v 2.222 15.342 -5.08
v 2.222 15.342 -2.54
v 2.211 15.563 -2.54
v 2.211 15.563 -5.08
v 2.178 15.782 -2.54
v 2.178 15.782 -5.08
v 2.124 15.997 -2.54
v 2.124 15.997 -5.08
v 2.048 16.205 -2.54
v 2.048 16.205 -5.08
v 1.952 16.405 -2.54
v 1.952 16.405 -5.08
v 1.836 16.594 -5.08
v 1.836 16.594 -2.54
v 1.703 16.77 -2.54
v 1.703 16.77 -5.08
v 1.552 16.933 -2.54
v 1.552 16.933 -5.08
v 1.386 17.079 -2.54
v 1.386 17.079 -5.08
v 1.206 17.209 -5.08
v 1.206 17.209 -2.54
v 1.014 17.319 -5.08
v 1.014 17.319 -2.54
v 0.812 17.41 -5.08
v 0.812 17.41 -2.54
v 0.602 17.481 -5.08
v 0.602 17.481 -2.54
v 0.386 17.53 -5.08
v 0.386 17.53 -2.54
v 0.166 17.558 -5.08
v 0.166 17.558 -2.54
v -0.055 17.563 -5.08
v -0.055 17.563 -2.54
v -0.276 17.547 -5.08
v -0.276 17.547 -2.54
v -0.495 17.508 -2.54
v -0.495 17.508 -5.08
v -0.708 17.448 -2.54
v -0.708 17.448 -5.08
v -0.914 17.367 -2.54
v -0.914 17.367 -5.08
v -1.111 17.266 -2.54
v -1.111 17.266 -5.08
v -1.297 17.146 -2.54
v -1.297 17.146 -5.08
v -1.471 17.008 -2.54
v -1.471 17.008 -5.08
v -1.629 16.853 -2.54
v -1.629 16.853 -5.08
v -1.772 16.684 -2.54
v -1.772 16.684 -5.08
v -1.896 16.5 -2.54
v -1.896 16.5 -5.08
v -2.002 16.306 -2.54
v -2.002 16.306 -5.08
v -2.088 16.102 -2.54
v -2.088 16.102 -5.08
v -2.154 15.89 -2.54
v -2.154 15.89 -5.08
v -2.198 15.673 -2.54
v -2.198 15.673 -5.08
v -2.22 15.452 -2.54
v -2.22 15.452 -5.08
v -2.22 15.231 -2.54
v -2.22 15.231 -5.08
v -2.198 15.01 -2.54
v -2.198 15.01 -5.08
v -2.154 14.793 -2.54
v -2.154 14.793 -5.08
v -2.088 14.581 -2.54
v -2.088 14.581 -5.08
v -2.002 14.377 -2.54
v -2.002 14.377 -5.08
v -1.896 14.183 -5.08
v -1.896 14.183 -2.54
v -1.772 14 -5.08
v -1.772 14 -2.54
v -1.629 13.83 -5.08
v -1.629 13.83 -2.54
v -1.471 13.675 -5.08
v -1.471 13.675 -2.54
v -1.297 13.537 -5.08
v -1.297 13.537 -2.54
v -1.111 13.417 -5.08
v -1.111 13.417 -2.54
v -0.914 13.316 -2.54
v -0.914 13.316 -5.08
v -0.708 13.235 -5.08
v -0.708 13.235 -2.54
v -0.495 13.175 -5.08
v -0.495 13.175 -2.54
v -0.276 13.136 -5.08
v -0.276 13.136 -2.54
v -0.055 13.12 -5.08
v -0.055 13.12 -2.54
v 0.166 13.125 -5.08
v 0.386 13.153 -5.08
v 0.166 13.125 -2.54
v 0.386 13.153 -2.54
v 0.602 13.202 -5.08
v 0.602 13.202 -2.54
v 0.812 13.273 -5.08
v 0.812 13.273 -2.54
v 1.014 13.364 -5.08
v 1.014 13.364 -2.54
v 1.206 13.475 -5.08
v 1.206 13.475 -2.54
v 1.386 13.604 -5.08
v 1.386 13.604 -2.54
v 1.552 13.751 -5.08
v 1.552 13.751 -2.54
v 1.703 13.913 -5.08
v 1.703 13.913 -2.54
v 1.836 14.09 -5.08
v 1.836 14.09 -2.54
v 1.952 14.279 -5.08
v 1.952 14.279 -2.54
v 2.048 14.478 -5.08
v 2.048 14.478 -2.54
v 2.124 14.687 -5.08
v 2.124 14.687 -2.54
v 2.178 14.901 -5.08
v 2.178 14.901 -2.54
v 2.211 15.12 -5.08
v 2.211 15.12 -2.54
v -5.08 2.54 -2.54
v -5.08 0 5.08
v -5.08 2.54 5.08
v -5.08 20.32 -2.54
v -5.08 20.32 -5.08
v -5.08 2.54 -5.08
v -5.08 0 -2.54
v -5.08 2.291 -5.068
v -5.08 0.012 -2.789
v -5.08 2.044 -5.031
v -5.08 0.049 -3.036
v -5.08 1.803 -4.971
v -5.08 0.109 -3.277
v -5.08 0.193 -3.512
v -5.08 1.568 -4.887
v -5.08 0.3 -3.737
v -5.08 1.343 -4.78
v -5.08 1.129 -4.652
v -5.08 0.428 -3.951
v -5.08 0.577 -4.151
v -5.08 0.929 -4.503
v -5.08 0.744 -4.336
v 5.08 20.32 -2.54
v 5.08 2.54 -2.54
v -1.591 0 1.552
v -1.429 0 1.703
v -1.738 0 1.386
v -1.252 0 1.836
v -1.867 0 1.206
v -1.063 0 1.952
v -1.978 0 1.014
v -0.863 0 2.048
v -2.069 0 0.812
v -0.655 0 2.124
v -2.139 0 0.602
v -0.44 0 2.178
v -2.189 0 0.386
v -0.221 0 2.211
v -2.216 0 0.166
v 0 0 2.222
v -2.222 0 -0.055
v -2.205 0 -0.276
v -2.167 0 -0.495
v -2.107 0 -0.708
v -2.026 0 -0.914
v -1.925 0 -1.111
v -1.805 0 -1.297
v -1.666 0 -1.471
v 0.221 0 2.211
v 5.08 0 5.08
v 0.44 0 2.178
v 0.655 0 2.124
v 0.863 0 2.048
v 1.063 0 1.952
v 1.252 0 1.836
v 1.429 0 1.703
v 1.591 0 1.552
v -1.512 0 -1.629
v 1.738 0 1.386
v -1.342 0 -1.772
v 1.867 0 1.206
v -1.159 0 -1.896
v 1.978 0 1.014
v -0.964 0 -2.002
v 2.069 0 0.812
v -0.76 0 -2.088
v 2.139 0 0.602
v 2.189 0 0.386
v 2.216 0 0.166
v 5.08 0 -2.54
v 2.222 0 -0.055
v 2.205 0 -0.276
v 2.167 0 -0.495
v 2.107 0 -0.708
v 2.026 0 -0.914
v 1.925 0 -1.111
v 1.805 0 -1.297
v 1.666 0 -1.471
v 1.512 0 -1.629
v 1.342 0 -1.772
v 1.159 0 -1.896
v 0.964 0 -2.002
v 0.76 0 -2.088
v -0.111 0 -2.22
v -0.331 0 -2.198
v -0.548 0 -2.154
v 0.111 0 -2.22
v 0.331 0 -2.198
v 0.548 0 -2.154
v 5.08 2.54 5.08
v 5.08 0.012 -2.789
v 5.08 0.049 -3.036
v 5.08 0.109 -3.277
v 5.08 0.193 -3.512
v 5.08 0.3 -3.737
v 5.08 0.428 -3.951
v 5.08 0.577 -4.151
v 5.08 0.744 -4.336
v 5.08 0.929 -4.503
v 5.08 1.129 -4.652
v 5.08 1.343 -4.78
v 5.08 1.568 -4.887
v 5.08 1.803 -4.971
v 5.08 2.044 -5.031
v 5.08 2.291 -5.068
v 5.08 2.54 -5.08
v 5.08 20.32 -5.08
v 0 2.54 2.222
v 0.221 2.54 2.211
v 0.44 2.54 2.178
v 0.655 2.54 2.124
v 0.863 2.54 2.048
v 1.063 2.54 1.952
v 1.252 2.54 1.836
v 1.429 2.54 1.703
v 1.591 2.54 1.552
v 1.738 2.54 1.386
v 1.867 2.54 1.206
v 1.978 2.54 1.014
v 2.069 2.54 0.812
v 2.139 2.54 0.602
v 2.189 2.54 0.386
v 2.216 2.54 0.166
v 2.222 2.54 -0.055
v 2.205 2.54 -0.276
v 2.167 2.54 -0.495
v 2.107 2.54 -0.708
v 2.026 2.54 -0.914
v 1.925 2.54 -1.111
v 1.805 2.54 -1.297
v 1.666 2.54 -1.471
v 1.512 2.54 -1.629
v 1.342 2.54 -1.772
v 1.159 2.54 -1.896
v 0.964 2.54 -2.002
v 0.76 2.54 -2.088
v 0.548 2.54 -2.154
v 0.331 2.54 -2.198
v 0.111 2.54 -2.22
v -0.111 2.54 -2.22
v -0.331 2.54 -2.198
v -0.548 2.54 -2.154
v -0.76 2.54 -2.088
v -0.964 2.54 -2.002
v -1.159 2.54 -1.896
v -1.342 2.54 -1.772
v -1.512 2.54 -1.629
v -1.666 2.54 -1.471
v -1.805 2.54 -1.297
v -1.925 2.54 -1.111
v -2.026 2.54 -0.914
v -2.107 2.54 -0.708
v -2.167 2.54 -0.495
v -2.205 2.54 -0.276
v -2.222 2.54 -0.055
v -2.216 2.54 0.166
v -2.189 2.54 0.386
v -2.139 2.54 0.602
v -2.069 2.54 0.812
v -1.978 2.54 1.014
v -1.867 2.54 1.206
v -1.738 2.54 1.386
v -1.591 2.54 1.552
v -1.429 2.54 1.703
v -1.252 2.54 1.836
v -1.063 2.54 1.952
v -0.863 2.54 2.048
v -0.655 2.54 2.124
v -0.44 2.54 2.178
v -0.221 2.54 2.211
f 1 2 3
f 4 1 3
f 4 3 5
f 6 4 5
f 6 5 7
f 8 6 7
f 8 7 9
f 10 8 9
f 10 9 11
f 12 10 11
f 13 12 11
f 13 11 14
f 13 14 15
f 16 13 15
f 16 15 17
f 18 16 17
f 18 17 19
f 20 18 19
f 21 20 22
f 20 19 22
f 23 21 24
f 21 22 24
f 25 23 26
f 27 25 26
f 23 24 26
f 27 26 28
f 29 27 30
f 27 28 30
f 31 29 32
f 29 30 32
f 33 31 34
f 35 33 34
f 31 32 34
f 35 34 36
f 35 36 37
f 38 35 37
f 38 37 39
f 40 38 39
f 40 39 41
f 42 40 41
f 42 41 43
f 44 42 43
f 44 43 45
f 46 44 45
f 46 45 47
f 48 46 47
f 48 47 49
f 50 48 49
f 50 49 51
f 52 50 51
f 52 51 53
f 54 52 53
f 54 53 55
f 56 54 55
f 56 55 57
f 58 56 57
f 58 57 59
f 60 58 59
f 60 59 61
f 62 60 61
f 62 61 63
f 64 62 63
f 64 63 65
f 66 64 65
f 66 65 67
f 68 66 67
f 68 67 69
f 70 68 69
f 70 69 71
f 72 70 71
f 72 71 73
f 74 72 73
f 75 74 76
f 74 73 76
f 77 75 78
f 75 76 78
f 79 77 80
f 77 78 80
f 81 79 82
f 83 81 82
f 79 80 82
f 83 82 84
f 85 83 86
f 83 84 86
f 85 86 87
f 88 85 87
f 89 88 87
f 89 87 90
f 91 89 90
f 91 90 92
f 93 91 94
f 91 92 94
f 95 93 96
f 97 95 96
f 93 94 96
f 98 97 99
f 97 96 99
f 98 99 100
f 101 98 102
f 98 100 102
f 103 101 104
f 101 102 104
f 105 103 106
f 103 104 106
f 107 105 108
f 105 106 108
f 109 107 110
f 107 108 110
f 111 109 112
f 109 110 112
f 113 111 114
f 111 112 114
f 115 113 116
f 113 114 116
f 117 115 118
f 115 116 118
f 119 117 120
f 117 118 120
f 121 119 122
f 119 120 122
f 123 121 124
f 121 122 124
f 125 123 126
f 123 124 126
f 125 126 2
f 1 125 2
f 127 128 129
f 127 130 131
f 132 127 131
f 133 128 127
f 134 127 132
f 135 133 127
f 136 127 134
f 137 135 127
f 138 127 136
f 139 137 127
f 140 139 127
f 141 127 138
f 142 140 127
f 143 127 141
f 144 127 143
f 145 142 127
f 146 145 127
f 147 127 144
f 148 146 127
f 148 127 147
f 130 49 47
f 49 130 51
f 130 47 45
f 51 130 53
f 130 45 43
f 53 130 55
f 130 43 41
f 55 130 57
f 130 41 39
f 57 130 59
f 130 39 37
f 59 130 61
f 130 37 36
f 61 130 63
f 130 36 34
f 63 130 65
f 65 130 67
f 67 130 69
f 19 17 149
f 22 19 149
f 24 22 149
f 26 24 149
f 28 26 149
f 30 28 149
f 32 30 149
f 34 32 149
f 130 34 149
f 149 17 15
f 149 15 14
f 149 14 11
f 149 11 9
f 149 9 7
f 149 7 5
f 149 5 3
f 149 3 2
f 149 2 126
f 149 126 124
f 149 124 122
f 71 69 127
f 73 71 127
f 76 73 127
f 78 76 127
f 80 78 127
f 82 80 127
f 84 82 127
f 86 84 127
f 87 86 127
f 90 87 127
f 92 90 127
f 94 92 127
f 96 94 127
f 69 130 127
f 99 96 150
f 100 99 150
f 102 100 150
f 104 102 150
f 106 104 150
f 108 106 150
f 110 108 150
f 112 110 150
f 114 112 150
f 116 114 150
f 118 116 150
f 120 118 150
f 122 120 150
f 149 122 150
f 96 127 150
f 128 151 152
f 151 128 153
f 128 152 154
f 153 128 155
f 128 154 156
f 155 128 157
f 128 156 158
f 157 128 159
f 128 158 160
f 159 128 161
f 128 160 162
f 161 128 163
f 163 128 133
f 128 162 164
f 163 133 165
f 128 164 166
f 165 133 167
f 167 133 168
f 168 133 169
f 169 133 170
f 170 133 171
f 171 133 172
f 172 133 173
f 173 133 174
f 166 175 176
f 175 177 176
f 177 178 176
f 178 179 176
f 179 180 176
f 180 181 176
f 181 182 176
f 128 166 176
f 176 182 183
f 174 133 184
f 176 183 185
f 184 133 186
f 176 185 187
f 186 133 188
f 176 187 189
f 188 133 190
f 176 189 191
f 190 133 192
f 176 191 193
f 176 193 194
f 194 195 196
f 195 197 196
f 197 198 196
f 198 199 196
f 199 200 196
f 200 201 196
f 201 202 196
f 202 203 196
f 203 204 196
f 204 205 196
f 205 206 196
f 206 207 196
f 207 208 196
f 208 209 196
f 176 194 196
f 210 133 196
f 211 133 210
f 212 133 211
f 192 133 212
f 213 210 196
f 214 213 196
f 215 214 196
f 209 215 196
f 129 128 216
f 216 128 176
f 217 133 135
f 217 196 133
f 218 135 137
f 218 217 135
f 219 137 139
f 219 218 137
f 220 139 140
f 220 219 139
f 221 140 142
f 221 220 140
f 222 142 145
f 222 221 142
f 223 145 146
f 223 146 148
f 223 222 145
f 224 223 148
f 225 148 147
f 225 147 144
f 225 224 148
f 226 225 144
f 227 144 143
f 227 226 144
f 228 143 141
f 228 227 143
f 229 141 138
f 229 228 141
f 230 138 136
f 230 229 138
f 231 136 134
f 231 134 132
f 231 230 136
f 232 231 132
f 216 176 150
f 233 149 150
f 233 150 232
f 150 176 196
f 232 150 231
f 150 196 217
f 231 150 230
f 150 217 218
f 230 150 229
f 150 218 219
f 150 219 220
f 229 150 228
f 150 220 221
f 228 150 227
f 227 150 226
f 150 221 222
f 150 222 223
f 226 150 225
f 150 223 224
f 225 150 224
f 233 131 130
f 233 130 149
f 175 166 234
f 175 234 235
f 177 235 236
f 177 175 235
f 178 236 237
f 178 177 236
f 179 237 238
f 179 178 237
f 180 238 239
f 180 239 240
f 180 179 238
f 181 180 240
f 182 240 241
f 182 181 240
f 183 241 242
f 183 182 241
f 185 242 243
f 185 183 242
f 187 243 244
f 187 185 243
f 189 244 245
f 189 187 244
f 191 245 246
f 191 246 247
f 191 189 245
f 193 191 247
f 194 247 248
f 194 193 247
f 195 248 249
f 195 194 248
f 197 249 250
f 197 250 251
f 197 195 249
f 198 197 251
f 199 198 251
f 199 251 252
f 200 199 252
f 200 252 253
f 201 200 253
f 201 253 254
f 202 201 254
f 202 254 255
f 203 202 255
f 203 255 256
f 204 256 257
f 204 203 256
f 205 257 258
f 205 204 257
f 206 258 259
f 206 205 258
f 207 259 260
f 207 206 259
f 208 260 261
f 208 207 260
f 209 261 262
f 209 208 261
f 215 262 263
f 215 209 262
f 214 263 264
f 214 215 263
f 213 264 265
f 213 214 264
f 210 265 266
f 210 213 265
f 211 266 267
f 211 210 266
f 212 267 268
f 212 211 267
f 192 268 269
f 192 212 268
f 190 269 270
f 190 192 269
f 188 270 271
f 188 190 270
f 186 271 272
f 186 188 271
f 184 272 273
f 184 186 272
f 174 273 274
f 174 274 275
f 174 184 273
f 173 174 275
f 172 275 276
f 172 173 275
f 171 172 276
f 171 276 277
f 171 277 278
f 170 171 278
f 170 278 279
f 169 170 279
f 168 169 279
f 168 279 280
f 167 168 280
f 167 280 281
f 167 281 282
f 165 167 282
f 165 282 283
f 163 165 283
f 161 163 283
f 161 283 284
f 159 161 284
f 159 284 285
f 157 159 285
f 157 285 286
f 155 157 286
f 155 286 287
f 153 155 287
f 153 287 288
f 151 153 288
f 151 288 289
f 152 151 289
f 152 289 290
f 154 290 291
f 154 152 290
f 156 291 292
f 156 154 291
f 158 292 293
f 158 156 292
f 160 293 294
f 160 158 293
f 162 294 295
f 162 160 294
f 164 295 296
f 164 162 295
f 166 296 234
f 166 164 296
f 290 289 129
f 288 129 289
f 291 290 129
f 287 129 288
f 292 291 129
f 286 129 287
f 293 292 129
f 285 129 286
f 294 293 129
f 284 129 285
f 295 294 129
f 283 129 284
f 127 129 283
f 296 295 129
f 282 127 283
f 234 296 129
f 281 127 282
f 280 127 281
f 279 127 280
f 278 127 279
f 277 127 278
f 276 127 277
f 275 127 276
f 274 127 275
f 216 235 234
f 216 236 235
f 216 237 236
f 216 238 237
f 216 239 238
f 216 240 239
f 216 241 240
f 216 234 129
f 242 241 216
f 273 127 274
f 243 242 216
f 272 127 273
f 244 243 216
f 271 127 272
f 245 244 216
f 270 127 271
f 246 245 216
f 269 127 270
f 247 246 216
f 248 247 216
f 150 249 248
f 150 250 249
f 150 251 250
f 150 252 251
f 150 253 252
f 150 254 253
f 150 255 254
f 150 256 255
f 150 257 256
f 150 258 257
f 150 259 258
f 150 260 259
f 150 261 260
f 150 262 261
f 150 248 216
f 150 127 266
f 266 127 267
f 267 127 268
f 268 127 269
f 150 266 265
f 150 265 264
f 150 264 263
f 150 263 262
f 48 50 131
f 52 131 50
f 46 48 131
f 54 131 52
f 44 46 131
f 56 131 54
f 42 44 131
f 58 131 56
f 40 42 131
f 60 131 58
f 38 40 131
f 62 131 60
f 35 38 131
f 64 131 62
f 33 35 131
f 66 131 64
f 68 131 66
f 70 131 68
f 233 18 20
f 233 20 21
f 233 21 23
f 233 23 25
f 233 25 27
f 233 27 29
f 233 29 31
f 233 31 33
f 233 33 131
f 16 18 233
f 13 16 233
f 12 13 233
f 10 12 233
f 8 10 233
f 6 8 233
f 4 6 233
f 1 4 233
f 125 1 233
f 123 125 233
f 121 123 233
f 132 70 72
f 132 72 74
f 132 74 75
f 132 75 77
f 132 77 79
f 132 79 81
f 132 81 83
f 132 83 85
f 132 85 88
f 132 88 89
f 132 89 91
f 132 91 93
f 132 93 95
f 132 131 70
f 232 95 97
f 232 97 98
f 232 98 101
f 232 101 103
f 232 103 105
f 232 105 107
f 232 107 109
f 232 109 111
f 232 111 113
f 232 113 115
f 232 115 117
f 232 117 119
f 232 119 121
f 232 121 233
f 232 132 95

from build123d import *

# Parameters (mm, degrees)
SKETCH1_W           = 10.16
SKETCH1_H           = 7.62
SKETCH1_R           = 2.2225
BOSS_EXTRUDE1_DEPTH = 2.54
SKETCH1_4_W         = 10.16
SKETCH1_4_H         = 2.54
BOSS_EXTRUDE2_DEPTH = 20.32
FILLET1_R           = 2.54
CUT_EXTRUDE1_REACH  = 24.288
SKETCH2_R           = 2.2225


with BuildPart() as part:
    # Sketch1 → Boss-Extrude1 (new body)
    with BuildSketch(Plane(origin=(0, 0, 0), x_dir=(1, 0, 0), z_dir=(0, 1, 0))):
        with Locations((0, -1.27)):
            Rectangle(SKETCH1_W, SKETCH1_H)
        Circle(SKETCH1_R, mode=Mode.SUBTRACT)
    extrude(amount=BOSS_EXTRUDE1_DEPTH)

    # Sketch1<4> → Boss-Extrude2 (add)
    with BuildSketch(Plane(origin=(0, 0, 0), x_dir=(1, 0, 0), z_dir=(0, 1, 0))):
        with Locations((0, 3.81)):
            Rectangle(SKETCH1_4_W, SKETCH1_4_H)
    extrude(amount=BOSS_EXTRUDE2_DEPTH)

    # Fillet1
    fillet1_edges = [part.edges().sort_by_distance(p)[0] for p in [
        (0, 0, -5.08),
    ]]
    fillet(fillet1_edges, radius=FILLET1_R)

    # Sketch2 → Cut-Extrude1 (cut, up to next)
    with BuildSketch(Plane.XY.offset(-2.54), mode=Mode.PRIVATE) as cut_extrude1_sk1:
        with Locations((0, 15.3416)):
            Circle(SKETCH2_R)
    cut_extrude1_tool1 = extrude(cut_extrude1_sk1.sketch, amount=-CUT_EXTRUDE1_REACH, mode=Mode.PRIVATE) & part.part
    add(cut_extrude1_tool1.solids().sort_by_distance((0, 15.3416, -2.54))[0], mode=Mode.SUBTRACT)


solid = part.part
